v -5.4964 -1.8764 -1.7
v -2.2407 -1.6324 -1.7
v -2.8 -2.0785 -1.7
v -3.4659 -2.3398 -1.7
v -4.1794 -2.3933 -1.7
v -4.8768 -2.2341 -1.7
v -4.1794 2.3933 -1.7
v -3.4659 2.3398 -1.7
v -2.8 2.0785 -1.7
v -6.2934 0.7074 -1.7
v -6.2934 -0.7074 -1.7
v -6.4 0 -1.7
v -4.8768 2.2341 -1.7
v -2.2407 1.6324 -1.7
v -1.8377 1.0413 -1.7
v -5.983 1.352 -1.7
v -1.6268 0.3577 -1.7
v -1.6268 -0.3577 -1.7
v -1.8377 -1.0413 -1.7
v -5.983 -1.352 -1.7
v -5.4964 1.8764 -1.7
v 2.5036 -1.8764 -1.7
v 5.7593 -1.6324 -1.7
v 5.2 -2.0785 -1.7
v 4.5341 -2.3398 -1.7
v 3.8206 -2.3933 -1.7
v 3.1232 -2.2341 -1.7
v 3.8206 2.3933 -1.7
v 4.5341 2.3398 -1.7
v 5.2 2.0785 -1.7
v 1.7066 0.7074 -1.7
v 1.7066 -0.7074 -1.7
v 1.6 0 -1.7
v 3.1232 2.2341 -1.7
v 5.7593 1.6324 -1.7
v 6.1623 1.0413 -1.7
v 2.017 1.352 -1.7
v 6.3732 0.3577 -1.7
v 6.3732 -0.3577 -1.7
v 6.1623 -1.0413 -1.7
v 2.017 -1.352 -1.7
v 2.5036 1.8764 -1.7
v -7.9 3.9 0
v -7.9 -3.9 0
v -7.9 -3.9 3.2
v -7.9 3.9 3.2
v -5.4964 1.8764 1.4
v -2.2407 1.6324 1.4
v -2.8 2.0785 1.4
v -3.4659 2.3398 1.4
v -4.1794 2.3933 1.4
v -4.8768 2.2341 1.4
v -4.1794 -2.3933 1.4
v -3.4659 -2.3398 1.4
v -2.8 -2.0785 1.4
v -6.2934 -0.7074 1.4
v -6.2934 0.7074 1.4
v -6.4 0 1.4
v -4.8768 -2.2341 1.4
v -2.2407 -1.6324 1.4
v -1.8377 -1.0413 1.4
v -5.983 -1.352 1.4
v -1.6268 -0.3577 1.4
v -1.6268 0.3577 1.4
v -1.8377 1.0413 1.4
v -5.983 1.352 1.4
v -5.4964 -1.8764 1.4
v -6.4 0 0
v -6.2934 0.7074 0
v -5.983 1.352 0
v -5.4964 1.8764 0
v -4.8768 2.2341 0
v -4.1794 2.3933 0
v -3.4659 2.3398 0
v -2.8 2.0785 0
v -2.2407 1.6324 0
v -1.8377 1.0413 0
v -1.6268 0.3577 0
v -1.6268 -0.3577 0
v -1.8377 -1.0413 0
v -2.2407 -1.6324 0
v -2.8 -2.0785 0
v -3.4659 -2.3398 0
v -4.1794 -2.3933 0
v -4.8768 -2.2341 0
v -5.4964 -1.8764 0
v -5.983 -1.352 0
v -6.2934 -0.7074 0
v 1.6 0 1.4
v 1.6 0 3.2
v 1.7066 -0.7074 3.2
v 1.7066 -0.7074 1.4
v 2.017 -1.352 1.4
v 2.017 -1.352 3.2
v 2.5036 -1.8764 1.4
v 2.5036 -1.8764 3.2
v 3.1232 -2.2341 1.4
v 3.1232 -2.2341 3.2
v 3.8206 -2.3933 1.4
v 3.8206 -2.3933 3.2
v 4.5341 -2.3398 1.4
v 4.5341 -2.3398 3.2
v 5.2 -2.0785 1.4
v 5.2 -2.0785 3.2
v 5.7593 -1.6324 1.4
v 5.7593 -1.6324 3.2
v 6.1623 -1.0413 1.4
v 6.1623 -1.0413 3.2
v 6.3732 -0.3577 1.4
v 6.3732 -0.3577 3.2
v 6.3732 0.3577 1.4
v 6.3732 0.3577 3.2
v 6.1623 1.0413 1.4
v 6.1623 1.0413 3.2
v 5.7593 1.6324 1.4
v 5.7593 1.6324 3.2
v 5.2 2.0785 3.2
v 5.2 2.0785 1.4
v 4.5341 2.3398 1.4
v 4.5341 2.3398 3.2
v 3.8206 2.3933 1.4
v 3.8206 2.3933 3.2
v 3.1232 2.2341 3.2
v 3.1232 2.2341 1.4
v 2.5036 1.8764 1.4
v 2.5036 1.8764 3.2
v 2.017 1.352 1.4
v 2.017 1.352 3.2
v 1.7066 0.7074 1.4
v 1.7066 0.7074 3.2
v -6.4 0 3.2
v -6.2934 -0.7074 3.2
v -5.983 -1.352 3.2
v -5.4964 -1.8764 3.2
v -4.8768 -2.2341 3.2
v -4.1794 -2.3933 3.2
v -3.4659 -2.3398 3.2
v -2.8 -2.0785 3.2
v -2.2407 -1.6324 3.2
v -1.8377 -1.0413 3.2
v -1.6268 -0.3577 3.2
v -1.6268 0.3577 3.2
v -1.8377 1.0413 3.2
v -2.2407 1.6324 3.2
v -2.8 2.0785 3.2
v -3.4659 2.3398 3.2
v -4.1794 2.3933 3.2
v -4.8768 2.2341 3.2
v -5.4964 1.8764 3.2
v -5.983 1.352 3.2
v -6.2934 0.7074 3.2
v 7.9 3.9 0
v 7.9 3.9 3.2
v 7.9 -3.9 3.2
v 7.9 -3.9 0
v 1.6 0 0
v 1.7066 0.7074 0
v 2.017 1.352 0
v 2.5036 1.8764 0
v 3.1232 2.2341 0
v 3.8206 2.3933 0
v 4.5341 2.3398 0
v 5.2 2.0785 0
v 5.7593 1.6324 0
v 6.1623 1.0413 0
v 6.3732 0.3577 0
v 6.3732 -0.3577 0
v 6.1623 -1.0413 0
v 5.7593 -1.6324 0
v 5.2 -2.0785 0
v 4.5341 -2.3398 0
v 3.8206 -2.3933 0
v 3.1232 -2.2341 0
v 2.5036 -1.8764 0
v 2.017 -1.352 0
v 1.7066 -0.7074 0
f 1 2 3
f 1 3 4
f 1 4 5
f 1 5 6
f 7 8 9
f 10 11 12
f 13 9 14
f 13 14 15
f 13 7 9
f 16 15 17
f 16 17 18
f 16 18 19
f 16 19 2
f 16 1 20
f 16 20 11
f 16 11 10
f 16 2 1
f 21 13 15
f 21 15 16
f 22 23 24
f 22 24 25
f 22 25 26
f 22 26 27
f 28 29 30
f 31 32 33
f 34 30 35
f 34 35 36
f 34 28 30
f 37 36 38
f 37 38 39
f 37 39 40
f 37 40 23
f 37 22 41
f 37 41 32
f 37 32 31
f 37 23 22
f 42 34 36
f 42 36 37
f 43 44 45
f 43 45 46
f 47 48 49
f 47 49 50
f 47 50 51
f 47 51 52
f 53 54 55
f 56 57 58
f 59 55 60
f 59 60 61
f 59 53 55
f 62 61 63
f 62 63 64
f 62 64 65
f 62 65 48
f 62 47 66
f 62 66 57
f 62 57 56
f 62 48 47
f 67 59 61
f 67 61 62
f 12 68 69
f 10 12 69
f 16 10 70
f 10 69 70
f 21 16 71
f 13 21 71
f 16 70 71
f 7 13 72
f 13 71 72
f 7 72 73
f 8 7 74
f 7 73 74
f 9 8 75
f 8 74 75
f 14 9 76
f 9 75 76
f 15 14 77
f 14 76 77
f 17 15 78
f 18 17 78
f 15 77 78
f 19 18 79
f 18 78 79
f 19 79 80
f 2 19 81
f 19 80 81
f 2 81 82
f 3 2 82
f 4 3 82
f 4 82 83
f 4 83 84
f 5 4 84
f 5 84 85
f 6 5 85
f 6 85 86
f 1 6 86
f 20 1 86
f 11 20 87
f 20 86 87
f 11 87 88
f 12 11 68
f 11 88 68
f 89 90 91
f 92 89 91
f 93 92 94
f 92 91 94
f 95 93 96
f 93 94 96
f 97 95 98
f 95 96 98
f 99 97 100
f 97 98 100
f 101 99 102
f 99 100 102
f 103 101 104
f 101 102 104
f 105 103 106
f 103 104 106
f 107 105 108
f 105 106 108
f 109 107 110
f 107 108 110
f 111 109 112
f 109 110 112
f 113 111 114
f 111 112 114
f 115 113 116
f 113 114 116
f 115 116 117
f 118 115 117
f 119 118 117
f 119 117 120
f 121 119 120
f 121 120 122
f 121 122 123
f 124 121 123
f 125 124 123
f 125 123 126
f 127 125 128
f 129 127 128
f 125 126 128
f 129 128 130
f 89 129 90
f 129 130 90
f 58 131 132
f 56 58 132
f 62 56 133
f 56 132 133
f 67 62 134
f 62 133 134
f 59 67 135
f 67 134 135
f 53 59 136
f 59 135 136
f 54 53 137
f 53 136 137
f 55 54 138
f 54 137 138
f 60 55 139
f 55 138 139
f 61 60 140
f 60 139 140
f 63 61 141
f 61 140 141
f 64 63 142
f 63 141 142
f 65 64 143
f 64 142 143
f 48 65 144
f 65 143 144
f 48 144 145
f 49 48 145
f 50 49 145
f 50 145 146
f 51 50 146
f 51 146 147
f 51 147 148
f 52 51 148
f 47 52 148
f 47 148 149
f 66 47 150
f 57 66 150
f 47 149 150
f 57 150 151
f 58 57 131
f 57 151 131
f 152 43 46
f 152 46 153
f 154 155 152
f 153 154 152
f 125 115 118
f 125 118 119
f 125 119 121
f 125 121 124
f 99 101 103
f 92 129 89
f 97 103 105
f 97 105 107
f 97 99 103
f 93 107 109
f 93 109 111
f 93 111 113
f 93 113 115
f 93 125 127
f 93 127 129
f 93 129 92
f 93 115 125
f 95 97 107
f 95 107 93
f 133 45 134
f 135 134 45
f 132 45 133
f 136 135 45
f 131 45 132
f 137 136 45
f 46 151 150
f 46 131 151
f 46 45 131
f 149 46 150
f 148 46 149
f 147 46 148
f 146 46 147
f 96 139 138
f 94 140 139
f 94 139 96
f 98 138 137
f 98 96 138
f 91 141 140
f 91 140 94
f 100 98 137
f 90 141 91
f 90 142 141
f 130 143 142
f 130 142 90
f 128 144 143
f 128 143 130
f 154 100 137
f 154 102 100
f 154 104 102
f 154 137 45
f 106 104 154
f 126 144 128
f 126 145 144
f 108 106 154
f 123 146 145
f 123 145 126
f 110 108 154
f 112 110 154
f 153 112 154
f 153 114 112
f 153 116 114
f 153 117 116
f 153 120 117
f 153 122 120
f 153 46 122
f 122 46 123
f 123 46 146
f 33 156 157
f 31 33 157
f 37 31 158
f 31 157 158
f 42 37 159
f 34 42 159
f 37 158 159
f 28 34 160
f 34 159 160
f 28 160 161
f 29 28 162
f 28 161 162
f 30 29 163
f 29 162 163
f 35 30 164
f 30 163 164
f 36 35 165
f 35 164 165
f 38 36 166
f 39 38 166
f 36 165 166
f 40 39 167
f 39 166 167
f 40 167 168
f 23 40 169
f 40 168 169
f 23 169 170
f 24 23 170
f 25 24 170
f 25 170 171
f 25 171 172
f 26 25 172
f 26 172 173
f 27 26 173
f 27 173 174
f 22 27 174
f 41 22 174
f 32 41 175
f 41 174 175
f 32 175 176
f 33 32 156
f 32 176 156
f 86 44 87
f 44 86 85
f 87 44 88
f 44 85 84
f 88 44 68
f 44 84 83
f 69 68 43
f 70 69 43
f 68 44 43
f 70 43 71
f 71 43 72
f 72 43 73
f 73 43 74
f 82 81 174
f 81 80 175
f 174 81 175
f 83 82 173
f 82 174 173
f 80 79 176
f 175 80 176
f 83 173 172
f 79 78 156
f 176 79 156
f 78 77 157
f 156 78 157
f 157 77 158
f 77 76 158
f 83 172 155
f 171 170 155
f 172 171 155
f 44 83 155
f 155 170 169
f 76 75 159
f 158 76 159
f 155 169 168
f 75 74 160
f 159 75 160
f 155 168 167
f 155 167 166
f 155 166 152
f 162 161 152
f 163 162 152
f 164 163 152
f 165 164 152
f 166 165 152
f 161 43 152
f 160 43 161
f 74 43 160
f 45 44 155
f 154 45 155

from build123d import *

# Parameters (mm, degrees)
SKETCH_3_W          = 15.8
SKETCH_3_H          = 7.8
EXTRUDE_2_DEPTH     = 3.2
SKETCH_4_R          = 2.4
EXTRUDE_3_DEPTH     = 1.7
SKETCH_5_R          = 2.4
CUT_EXTRUDE_1_DEPTH = 1.8


with BuildPart() as part:
    # Эскиз3 → Бобышка-Вытянуть2 (new body)
    with BuildSketch(Plane.XY):
        Rectangle(SKETCH_3_W, SKETCH_3_H)
    extrude(amount=EXTRUDE_2_DEPTH)

    # Эскиз4 → Бобышка-Вытянуть3 (add)
    with BuildSketch(Plane(origin=(0, 0, 0), x_dir=(-1, 0, 0), z_dir=(0, 0, -1))):
        with Locations((-4, 0)):
            Circle(SKETCH_4_R)
        with Locations((4, 0)):
            Circle(SKETCH_4_R)
    extrude(amount=EXTRUDE_3_DEPTH)

    # Эскиз5 → Вырез-Вытянуть1 (cut)
    with BuildSketch(Plane.XY.offset(3.2)):
        with Locations(Location((-4, 0, 0), (0, 0, 180))):
            Circle(SKETCH_5_R)
        with Locations(Location((4, 0, 0), (0, 0, 180))):
            Circle(SKETCH_5_R)
    extrude(amount=-CUT_EXTRUDE_1_DEPTH, mode=Mode.SUBTRACT)


solid = part.part
